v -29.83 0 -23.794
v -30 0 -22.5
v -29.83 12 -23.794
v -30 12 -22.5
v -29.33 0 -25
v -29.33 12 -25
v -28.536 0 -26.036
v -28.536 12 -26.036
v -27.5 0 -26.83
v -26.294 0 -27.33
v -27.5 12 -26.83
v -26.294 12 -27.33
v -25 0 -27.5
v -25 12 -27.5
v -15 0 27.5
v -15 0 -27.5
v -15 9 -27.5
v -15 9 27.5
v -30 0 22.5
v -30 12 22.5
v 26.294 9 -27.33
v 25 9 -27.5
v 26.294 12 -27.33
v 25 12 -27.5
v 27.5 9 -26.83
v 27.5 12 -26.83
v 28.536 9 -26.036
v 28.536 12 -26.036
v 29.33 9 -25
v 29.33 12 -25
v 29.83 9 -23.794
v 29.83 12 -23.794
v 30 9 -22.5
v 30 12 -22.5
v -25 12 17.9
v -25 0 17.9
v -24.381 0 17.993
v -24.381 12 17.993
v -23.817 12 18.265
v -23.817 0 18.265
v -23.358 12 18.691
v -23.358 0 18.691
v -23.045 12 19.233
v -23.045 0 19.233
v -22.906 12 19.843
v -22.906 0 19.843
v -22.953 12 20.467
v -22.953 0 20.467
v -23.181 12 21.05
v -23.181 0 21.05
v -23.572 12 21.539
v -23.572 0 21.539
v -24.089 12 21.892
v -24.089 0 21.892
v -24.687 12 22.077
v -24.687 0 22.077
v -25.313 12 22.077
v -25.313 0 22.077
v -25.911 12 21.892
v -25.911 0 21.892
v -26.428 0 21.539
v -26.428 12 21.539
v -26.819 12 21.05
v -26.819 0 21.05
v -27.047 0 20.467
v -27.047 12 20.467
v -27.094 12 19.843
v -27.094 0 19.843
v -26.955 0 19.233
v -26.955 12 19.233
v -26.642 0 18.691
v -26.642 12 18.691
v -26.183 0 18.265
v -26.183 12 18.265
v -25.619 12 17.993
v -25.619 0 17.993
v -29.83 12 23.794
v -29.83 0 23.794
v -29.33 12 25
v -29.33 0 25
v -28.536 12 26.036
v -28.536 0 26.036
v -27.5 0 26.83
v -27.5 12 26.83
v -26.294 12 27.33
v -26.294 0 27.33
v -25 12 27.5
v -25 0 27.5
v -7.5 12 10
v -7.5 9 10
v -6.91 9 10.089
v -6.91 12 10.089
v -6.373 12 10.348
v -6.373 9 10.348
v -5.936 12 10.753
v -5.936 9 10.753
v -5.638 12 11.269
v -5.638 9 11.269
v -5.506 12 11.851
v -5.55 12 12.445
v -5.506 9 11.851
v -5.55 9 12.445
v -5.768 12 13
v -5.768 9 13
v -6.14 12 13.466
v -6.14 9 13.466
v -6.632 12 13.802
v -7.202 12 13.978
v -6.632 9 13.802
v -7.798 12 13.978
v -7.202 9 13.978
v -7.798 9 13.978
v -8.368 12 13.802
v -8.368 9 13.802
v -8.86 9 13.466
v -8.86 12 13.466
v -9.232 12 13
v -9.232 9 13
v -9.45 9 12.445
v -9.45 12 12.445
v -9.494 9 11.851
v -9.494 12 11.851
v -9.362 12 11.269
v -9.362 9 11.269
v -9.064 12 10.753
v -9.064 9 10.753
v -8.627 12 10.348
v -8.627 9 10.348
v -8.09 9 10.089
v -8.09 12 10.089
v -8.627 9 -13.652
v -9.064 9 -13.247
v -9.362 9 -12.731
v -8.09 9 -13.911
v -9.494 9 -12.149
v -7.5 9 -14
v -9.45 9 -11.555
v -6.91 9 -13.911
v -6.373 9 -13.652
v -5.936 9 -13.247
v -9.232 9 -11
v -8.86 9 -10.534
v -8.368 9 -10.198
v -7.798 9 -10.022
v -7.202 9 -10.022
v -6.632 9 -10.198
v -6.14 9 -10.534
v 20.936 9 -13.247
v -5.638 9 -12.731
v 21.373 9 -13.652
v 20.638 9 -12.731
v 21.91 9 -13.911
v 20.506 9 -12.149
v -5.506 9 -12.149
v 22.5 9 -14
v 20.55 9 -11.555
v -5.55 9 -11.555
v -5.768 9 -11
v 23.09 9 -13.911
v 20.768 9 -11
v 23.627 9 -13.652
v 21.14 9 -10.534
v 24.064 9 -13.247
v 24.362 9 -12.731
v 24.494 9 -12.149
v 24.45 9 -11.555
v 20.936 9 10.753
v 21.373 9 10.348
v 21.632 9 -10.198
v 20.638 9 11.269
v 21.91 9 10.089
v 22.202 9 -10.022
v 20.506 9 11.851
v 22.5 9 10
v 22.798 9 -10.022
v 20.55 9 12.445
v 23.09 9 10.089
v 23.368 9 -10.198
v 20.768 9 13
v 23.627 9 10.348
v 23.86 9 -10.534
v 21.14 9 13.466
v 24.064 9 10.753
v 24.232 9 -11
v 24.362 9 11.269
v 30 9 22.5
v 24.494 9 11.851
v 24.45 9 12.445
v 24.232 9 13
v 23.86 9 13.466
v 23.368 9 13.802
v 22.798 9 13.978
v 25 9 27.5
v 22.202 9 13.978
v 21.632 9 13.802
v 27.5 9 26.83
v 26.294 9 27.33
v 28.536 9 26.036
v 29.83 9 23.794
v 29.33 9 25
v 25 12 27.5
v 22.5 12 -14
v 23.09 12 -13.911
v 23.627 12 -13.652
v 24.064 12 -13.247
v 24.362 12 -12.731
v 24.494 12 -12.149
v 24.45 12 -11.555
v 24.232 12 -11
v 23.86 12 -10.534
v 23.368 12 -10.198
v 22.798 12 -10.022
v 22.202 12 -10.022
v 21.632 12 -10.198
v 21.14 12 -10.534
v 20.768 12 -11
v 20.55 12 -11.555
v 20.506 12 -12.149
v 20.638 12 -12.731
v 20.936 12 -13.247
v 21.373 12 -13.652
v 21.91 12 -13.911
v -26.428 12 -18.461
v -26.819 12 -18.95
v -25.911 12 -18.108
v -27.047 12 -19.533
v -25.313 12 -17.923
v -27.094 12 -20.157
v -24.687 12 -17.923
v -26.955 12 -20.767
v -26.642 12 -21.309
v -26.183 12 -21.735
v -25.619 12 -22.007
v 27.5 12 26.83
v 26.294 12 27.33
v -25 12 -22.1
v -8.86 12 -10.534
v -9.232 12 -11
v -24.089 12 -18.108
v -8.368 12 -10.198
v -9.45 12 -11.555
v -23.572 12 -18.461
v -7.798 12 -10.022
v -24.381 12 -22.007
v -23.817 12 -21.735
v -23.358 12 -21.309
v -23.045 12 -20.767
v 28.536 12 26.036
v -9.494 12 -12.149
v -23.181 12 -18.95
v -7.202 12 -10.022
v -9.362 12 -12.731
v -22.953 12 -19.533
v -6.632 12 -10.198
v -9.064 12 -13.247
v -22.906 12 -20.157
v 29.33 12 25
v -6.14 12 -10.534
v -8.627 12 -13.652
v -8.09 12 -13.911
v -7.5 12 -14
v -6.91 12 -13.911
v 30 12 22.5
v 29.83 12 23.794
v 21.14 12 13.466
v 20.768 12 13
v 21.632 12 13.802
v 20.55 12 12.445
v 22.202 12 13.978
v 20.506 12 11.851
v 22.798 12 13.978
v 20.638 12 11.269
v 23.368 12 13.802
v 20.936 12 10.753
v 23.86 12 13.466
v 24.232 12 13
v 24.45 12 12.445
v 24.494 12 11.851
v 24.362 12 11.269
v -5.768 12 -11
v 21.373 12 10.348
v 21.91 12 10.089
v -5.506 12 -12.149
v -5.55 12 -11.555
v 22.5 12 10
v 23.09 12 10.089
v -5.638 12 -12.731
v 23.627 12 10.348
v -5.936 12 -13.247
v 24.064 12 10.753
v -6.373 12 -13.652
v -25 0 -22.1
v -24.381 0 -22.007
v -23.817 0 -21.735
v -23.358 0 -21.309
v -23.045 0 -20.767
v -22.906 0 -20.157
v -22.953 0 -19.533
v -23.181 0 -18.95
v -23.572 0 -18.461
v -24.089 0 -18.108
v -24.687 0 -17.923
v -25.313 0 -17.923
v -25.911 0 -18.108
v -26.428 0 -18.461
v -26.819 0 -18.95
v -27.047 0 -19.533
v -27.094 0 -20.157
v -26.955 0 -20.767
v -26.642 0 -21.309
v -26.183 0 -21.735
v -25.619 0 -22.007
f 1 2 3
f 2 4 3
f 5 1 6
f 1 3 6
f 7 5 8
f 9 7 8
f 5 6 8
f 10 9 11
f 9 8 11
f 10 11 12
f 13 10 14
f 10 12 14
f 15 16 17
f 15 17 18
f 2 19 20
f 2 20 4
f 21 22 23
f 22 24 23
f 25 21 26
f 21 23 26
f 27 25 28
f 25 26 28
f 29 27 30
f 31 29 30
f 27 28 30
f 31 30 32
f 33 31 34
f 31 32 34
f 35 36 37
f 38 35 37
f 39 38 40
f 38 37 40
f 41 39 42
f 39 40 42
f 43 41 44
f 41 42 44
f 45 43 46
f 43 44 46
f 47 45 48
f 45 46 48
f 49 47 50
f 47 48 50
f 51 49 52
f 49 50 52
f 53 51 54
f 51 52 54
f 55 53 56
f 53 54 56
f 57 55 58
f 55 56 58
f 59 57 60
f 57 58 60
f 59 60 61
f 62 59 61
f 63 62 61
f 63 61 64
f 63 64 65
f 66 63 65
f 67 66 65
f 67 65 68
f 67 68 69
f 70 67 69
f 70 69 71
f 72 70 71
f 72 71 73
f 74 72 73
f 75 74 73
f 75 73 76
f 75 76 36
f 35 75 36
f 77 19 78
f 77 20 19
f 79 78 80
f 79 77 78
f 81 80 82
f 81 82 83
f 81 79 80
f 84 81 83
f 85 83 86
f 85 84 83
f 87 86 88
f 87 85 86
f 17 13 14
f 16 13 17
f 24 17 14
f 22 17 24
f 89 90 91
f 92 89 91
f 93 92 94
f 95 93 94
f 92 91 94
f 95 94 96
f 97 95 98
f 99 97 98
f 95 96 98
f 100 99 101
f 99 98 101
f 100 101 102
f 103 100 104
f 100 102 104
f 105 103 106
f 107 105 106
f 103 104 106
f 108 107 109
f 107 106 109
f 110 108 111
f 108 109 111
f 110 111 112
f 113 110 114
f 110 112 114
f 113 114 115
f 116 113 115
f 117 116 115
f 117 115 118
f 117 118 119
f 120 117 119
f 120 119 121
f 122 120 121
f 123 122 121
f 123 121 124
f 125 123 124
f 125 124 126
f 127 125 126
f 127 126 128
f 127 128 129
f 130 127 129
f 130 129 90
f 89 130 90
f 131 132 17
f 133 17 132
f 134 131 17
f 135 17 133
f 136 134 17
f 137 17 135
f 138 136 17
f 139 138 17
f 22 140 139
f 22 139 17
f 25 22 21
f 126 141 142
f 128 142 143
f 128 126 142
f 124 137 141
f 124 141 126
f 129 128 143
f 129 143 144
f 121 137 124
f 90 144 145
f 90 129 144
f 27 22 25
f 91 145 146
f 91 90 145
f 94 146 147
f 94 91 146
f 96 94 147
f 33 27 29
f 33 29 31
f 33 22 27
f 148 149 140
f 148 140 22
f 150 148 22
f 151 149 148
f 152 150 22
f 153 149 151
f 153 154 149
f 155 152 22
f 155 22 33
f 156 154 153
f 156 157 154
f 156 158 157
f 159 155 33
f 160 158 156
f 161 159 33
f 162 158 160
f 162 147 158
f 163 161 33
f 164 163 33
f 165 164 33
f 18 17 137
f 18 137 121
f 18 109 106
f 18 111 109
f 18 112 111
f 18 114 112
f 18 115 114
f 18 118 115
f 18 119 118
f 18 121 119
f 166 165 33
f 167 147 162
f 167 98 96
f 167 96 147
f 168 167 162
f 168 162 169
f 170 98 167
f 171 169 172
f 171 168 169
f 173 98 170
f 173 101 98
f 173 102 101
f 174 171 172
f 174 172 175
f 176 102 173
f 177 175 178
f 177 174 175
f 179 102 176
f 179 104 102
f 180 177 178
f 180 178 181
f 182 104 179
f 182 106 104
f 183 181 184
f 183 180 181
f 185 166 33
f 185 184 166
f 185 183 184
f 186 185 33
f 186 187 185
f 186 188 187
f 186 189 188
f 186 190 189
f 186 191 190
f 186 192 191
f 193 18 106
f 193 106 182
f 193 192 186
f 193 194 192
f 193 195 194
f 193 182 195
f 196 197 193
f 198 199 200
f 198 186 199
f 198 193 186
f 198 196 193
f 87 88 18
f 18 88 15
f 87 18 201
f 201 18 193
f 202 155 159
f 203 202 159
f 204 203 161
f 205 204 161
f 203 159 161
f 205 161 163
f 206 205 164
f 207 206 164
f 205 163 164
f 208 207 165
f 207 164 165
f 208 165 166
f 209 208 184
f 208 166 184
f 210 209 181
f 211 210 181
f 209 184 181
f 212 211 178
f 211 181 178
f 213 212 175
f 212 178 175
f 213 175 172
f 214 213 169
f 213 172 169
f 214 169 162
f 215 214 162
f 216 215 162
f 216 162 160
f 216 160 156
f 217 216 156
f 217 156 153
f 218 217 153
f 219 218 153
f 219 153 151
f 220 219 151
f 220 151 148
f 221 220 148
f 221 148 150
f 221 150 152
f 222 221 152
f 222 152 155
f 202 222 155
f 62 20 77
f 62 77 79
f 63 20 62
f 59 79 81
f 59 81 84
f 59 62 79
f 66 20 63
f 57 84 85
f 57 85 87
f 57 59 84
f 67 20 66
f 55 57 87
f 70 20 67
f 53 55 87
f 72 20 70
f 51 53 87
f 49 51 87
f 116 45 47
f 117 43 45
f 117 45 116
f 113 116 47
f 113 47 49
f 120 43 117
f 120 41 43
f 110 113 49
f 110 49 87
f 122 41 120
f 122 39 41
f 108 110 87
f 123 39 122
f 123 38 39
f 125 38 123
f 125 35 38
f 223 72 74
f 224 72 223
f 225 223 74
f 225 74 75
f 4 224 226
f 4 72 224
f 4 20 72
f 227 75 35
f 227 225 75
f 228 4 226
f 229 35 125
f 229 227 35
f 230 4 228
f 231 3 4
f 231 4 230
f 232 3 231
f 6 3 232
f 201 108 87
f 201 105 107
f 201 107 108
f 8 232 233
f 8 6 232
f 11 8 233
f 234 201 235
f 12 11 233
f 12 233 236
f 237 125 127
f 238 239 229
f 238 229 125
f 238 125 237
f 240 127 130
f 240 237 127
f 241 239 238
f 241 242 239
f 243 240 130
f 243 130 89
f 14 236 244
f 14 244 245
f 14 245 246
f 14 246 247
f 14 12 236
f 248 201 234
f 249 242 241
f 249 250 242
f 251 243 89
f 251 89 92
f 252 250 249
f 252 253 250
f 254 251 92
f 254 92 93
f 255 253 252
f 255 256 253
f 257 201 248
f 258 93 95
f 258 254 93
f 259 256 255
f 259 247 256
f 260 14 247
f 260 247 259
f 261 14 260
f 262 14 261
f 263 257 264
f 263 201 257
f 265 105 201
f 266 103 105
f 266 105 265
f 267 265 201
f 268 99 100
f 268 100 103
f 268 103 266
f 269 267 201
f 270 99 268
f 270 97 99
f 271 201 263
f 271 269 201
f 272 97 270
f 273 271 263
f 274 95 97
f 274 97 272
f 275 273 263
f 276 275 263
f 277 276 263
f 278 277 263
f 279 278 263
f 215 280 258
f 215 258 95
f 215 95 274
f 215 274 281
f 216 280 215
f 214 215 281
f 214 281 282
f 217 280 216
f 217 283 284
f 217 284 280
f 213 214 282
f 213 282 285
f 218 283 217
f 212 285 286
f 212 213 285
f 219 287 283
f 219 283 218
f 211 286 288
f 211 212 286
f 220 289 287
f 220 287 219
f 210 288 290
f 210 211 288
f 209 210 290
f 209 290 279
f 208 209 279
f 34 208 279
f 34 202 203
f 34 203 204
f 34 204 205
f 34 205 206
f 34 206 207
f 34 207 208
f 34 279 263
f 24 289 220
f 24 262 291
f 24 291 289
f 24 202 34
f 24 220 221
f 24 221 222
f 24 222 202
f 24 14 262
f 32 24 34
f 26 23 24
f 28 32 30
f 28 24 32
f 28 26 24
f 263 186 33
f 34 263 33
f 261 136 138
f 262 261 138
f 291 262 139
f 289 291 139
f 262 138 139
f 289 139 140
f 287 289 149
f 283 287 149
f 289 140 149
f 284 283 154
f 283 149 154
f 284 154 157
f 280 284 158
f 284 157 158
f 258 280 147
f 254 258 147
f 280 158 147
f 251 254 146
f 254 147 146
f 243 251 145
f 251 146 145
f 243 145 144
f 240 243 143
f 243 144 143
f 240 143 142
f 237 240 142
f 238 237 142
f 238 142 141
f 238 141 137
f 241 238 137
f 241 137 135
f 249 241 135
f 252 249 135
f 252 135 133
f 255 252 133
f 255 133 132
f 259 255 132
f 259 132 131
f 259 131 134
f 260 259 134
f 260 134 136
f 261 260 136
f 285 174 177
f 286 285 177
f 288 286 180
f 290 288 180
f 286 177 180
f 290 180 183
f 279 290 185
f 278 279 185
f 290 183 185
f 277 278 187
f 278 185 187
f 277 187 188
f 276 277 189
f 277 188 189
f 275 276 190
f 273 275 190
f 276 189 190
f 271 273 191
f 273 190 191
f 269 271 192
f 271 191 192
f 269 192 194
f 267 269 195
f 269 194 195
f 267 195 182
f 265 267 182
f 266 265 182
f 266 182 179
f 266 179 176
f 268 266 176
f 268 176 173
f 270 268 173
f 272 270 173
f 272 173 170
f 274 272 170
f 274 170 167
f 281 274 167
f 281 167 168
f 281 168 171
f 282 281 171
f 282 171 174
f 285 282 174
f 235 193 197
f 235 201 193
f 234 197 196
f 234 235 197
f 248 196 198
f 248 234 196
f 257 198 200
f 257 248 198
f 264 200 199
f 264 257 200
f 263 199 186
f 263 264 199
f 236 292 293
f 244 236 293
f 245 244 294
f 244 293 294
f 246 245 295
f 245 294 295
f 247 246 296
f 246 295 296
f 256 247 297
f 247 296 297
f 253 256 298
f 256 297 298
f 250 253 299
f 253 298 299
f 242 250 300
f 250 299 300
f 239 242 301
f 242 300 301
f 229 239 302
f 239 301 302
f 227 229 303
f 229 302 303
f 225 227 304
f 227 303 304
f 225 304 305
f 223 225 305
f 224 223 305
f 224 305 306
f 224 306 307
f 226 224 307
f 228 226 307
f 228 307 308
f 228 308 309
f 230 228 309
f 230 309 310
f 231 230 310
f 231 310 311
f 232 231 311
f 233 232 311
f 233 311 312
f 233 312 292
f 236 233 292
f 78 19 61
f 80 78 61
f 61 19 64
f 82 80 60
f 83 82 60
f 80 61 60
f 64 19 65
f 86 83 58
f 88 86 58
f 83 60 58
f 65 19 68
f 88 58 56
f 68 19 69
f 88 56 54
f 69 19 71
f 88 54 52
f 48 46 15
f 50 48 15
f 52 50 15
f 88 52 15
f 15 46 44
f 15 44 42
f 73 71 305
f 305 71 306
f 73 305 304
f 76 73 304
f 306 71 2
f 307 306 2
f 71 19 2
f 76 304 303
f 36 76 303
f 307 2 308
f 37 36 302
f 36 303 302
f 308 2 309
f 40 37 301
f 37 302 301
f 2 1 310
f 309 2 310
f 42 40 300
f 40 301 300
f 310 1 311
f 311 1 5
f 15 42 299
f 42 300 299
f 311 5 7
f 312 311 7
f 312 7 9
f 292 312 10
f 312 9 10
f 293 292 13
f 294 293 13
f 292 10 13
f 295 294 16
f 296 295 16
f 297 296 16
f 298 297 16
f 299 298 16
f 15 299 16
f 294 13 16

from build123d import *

# Parameters (mm, degrees)
SKETCH1_W                 = 60
SKETCH1_H                 = 55
BOSS_EXTRUDE1_DEPTH       = 12
SKETCH2_W                 = 45
SKETCH2_H                 = 55
CUT_EXTRUDE2_DEPTH        = 9
M5_TAPPED_HOLE1_D         = 4.2
M5_TAPPED_HOLE1_DEPTH     = 12.4
M5_TAPPED_HOLE1_TIP       = 1.2618073
FILLET1_R                 = 5
F_4_0MM_DOWEL_HOLE2_D     = 4
F_4_0MM_DOWEL_HOLE2_DEPTH = 12.4
F_4_0MM_DOWEL_HOLE2_TIP   = 1.201721238


with BuildPart() as part:
    # Sketch1 → Boss-Extrude1 (new body)
    with BuildSketch(Plane(origin=(0, 0, 0), x_dir=(1, 0, 0), z_dir=(0, 1, 0))):
        Rectangle(SKETCH1_W, SKETCH1_H)
    extrude(amount=BOSS_EXTRUDE1_DEPTH)

    # Sketch2 → Cut-Extrude2 (cut)
    with BuildSketch(Plane.XZ):
        with Locations((7.5, 0)):
            Rectangle(SKETCH2_W, SKETCH2_H)
    extrude(amount=-CUT_EXTRUDE2_DEPTH, mode=Mode.SUBTRACT)

    # M5 Tapped Hole1
    with Locations(Plane(origin=(-25, 12, -20), x_dir=(0, 0, 1), z_dir=(0, 1, 0))):
        with Locations((0, 0), (40, 0)):
            Hole(M5_TAPPED_HOLE1_D / 2, depth=M5_TAPPED_HOLE1_DEPTH)
            with Locations((0, 0, -(M5_TAPPED_HOLE1_DEPTH + M5_TAPPED_HOLE1_TIP / 2))):  # 118° drill point
                Cone(0, M5_TAPPED_HOLE1_D / 2, M5_TAPPED_HOLE1_TIP, mode=Mode.SUBTRACT)

    # Fillet1
    fillet1_edges = [part.edges().sort_by_distance(p)[0] for p in [
        (30, 10.5, 27.5),
        (-30, 6, 27.5),
        (-30, 6, -27.5),
        (30, 10.5, -27.5),
    ]]
    fillet(fillet1_edges, radius=FILLET1_R)

    # Ø4.0mm Dowel Hole2
    with Locations(Plane(origin=(-7.5, 12, -12), x_dir=(0, 0, 1), z_dir=(0, 1, 0))):
        with Locations((0, 0), (24, 0), (24, 30), (0, 30)):
            Hole(F_4_0MM_DOWEL_HOLE2_D / 2, depth=F_4_0MM_DOWEL_HOLE2_DEPTH)
            with Locations((0, 0, -(F_4_0MM_DOWEL_HOLE2_DEPTH + F_4_0MM_DOWEL_HOLE2_TIP / 2))):  # 118° drill point
                Cone(0, F_4_0MM_DOWEL_HOLE2_D / 2, F_4_0MM_DOWEL_HOLE2_TIP, mode=Mode.SUBTRACT)


solid = part.part
